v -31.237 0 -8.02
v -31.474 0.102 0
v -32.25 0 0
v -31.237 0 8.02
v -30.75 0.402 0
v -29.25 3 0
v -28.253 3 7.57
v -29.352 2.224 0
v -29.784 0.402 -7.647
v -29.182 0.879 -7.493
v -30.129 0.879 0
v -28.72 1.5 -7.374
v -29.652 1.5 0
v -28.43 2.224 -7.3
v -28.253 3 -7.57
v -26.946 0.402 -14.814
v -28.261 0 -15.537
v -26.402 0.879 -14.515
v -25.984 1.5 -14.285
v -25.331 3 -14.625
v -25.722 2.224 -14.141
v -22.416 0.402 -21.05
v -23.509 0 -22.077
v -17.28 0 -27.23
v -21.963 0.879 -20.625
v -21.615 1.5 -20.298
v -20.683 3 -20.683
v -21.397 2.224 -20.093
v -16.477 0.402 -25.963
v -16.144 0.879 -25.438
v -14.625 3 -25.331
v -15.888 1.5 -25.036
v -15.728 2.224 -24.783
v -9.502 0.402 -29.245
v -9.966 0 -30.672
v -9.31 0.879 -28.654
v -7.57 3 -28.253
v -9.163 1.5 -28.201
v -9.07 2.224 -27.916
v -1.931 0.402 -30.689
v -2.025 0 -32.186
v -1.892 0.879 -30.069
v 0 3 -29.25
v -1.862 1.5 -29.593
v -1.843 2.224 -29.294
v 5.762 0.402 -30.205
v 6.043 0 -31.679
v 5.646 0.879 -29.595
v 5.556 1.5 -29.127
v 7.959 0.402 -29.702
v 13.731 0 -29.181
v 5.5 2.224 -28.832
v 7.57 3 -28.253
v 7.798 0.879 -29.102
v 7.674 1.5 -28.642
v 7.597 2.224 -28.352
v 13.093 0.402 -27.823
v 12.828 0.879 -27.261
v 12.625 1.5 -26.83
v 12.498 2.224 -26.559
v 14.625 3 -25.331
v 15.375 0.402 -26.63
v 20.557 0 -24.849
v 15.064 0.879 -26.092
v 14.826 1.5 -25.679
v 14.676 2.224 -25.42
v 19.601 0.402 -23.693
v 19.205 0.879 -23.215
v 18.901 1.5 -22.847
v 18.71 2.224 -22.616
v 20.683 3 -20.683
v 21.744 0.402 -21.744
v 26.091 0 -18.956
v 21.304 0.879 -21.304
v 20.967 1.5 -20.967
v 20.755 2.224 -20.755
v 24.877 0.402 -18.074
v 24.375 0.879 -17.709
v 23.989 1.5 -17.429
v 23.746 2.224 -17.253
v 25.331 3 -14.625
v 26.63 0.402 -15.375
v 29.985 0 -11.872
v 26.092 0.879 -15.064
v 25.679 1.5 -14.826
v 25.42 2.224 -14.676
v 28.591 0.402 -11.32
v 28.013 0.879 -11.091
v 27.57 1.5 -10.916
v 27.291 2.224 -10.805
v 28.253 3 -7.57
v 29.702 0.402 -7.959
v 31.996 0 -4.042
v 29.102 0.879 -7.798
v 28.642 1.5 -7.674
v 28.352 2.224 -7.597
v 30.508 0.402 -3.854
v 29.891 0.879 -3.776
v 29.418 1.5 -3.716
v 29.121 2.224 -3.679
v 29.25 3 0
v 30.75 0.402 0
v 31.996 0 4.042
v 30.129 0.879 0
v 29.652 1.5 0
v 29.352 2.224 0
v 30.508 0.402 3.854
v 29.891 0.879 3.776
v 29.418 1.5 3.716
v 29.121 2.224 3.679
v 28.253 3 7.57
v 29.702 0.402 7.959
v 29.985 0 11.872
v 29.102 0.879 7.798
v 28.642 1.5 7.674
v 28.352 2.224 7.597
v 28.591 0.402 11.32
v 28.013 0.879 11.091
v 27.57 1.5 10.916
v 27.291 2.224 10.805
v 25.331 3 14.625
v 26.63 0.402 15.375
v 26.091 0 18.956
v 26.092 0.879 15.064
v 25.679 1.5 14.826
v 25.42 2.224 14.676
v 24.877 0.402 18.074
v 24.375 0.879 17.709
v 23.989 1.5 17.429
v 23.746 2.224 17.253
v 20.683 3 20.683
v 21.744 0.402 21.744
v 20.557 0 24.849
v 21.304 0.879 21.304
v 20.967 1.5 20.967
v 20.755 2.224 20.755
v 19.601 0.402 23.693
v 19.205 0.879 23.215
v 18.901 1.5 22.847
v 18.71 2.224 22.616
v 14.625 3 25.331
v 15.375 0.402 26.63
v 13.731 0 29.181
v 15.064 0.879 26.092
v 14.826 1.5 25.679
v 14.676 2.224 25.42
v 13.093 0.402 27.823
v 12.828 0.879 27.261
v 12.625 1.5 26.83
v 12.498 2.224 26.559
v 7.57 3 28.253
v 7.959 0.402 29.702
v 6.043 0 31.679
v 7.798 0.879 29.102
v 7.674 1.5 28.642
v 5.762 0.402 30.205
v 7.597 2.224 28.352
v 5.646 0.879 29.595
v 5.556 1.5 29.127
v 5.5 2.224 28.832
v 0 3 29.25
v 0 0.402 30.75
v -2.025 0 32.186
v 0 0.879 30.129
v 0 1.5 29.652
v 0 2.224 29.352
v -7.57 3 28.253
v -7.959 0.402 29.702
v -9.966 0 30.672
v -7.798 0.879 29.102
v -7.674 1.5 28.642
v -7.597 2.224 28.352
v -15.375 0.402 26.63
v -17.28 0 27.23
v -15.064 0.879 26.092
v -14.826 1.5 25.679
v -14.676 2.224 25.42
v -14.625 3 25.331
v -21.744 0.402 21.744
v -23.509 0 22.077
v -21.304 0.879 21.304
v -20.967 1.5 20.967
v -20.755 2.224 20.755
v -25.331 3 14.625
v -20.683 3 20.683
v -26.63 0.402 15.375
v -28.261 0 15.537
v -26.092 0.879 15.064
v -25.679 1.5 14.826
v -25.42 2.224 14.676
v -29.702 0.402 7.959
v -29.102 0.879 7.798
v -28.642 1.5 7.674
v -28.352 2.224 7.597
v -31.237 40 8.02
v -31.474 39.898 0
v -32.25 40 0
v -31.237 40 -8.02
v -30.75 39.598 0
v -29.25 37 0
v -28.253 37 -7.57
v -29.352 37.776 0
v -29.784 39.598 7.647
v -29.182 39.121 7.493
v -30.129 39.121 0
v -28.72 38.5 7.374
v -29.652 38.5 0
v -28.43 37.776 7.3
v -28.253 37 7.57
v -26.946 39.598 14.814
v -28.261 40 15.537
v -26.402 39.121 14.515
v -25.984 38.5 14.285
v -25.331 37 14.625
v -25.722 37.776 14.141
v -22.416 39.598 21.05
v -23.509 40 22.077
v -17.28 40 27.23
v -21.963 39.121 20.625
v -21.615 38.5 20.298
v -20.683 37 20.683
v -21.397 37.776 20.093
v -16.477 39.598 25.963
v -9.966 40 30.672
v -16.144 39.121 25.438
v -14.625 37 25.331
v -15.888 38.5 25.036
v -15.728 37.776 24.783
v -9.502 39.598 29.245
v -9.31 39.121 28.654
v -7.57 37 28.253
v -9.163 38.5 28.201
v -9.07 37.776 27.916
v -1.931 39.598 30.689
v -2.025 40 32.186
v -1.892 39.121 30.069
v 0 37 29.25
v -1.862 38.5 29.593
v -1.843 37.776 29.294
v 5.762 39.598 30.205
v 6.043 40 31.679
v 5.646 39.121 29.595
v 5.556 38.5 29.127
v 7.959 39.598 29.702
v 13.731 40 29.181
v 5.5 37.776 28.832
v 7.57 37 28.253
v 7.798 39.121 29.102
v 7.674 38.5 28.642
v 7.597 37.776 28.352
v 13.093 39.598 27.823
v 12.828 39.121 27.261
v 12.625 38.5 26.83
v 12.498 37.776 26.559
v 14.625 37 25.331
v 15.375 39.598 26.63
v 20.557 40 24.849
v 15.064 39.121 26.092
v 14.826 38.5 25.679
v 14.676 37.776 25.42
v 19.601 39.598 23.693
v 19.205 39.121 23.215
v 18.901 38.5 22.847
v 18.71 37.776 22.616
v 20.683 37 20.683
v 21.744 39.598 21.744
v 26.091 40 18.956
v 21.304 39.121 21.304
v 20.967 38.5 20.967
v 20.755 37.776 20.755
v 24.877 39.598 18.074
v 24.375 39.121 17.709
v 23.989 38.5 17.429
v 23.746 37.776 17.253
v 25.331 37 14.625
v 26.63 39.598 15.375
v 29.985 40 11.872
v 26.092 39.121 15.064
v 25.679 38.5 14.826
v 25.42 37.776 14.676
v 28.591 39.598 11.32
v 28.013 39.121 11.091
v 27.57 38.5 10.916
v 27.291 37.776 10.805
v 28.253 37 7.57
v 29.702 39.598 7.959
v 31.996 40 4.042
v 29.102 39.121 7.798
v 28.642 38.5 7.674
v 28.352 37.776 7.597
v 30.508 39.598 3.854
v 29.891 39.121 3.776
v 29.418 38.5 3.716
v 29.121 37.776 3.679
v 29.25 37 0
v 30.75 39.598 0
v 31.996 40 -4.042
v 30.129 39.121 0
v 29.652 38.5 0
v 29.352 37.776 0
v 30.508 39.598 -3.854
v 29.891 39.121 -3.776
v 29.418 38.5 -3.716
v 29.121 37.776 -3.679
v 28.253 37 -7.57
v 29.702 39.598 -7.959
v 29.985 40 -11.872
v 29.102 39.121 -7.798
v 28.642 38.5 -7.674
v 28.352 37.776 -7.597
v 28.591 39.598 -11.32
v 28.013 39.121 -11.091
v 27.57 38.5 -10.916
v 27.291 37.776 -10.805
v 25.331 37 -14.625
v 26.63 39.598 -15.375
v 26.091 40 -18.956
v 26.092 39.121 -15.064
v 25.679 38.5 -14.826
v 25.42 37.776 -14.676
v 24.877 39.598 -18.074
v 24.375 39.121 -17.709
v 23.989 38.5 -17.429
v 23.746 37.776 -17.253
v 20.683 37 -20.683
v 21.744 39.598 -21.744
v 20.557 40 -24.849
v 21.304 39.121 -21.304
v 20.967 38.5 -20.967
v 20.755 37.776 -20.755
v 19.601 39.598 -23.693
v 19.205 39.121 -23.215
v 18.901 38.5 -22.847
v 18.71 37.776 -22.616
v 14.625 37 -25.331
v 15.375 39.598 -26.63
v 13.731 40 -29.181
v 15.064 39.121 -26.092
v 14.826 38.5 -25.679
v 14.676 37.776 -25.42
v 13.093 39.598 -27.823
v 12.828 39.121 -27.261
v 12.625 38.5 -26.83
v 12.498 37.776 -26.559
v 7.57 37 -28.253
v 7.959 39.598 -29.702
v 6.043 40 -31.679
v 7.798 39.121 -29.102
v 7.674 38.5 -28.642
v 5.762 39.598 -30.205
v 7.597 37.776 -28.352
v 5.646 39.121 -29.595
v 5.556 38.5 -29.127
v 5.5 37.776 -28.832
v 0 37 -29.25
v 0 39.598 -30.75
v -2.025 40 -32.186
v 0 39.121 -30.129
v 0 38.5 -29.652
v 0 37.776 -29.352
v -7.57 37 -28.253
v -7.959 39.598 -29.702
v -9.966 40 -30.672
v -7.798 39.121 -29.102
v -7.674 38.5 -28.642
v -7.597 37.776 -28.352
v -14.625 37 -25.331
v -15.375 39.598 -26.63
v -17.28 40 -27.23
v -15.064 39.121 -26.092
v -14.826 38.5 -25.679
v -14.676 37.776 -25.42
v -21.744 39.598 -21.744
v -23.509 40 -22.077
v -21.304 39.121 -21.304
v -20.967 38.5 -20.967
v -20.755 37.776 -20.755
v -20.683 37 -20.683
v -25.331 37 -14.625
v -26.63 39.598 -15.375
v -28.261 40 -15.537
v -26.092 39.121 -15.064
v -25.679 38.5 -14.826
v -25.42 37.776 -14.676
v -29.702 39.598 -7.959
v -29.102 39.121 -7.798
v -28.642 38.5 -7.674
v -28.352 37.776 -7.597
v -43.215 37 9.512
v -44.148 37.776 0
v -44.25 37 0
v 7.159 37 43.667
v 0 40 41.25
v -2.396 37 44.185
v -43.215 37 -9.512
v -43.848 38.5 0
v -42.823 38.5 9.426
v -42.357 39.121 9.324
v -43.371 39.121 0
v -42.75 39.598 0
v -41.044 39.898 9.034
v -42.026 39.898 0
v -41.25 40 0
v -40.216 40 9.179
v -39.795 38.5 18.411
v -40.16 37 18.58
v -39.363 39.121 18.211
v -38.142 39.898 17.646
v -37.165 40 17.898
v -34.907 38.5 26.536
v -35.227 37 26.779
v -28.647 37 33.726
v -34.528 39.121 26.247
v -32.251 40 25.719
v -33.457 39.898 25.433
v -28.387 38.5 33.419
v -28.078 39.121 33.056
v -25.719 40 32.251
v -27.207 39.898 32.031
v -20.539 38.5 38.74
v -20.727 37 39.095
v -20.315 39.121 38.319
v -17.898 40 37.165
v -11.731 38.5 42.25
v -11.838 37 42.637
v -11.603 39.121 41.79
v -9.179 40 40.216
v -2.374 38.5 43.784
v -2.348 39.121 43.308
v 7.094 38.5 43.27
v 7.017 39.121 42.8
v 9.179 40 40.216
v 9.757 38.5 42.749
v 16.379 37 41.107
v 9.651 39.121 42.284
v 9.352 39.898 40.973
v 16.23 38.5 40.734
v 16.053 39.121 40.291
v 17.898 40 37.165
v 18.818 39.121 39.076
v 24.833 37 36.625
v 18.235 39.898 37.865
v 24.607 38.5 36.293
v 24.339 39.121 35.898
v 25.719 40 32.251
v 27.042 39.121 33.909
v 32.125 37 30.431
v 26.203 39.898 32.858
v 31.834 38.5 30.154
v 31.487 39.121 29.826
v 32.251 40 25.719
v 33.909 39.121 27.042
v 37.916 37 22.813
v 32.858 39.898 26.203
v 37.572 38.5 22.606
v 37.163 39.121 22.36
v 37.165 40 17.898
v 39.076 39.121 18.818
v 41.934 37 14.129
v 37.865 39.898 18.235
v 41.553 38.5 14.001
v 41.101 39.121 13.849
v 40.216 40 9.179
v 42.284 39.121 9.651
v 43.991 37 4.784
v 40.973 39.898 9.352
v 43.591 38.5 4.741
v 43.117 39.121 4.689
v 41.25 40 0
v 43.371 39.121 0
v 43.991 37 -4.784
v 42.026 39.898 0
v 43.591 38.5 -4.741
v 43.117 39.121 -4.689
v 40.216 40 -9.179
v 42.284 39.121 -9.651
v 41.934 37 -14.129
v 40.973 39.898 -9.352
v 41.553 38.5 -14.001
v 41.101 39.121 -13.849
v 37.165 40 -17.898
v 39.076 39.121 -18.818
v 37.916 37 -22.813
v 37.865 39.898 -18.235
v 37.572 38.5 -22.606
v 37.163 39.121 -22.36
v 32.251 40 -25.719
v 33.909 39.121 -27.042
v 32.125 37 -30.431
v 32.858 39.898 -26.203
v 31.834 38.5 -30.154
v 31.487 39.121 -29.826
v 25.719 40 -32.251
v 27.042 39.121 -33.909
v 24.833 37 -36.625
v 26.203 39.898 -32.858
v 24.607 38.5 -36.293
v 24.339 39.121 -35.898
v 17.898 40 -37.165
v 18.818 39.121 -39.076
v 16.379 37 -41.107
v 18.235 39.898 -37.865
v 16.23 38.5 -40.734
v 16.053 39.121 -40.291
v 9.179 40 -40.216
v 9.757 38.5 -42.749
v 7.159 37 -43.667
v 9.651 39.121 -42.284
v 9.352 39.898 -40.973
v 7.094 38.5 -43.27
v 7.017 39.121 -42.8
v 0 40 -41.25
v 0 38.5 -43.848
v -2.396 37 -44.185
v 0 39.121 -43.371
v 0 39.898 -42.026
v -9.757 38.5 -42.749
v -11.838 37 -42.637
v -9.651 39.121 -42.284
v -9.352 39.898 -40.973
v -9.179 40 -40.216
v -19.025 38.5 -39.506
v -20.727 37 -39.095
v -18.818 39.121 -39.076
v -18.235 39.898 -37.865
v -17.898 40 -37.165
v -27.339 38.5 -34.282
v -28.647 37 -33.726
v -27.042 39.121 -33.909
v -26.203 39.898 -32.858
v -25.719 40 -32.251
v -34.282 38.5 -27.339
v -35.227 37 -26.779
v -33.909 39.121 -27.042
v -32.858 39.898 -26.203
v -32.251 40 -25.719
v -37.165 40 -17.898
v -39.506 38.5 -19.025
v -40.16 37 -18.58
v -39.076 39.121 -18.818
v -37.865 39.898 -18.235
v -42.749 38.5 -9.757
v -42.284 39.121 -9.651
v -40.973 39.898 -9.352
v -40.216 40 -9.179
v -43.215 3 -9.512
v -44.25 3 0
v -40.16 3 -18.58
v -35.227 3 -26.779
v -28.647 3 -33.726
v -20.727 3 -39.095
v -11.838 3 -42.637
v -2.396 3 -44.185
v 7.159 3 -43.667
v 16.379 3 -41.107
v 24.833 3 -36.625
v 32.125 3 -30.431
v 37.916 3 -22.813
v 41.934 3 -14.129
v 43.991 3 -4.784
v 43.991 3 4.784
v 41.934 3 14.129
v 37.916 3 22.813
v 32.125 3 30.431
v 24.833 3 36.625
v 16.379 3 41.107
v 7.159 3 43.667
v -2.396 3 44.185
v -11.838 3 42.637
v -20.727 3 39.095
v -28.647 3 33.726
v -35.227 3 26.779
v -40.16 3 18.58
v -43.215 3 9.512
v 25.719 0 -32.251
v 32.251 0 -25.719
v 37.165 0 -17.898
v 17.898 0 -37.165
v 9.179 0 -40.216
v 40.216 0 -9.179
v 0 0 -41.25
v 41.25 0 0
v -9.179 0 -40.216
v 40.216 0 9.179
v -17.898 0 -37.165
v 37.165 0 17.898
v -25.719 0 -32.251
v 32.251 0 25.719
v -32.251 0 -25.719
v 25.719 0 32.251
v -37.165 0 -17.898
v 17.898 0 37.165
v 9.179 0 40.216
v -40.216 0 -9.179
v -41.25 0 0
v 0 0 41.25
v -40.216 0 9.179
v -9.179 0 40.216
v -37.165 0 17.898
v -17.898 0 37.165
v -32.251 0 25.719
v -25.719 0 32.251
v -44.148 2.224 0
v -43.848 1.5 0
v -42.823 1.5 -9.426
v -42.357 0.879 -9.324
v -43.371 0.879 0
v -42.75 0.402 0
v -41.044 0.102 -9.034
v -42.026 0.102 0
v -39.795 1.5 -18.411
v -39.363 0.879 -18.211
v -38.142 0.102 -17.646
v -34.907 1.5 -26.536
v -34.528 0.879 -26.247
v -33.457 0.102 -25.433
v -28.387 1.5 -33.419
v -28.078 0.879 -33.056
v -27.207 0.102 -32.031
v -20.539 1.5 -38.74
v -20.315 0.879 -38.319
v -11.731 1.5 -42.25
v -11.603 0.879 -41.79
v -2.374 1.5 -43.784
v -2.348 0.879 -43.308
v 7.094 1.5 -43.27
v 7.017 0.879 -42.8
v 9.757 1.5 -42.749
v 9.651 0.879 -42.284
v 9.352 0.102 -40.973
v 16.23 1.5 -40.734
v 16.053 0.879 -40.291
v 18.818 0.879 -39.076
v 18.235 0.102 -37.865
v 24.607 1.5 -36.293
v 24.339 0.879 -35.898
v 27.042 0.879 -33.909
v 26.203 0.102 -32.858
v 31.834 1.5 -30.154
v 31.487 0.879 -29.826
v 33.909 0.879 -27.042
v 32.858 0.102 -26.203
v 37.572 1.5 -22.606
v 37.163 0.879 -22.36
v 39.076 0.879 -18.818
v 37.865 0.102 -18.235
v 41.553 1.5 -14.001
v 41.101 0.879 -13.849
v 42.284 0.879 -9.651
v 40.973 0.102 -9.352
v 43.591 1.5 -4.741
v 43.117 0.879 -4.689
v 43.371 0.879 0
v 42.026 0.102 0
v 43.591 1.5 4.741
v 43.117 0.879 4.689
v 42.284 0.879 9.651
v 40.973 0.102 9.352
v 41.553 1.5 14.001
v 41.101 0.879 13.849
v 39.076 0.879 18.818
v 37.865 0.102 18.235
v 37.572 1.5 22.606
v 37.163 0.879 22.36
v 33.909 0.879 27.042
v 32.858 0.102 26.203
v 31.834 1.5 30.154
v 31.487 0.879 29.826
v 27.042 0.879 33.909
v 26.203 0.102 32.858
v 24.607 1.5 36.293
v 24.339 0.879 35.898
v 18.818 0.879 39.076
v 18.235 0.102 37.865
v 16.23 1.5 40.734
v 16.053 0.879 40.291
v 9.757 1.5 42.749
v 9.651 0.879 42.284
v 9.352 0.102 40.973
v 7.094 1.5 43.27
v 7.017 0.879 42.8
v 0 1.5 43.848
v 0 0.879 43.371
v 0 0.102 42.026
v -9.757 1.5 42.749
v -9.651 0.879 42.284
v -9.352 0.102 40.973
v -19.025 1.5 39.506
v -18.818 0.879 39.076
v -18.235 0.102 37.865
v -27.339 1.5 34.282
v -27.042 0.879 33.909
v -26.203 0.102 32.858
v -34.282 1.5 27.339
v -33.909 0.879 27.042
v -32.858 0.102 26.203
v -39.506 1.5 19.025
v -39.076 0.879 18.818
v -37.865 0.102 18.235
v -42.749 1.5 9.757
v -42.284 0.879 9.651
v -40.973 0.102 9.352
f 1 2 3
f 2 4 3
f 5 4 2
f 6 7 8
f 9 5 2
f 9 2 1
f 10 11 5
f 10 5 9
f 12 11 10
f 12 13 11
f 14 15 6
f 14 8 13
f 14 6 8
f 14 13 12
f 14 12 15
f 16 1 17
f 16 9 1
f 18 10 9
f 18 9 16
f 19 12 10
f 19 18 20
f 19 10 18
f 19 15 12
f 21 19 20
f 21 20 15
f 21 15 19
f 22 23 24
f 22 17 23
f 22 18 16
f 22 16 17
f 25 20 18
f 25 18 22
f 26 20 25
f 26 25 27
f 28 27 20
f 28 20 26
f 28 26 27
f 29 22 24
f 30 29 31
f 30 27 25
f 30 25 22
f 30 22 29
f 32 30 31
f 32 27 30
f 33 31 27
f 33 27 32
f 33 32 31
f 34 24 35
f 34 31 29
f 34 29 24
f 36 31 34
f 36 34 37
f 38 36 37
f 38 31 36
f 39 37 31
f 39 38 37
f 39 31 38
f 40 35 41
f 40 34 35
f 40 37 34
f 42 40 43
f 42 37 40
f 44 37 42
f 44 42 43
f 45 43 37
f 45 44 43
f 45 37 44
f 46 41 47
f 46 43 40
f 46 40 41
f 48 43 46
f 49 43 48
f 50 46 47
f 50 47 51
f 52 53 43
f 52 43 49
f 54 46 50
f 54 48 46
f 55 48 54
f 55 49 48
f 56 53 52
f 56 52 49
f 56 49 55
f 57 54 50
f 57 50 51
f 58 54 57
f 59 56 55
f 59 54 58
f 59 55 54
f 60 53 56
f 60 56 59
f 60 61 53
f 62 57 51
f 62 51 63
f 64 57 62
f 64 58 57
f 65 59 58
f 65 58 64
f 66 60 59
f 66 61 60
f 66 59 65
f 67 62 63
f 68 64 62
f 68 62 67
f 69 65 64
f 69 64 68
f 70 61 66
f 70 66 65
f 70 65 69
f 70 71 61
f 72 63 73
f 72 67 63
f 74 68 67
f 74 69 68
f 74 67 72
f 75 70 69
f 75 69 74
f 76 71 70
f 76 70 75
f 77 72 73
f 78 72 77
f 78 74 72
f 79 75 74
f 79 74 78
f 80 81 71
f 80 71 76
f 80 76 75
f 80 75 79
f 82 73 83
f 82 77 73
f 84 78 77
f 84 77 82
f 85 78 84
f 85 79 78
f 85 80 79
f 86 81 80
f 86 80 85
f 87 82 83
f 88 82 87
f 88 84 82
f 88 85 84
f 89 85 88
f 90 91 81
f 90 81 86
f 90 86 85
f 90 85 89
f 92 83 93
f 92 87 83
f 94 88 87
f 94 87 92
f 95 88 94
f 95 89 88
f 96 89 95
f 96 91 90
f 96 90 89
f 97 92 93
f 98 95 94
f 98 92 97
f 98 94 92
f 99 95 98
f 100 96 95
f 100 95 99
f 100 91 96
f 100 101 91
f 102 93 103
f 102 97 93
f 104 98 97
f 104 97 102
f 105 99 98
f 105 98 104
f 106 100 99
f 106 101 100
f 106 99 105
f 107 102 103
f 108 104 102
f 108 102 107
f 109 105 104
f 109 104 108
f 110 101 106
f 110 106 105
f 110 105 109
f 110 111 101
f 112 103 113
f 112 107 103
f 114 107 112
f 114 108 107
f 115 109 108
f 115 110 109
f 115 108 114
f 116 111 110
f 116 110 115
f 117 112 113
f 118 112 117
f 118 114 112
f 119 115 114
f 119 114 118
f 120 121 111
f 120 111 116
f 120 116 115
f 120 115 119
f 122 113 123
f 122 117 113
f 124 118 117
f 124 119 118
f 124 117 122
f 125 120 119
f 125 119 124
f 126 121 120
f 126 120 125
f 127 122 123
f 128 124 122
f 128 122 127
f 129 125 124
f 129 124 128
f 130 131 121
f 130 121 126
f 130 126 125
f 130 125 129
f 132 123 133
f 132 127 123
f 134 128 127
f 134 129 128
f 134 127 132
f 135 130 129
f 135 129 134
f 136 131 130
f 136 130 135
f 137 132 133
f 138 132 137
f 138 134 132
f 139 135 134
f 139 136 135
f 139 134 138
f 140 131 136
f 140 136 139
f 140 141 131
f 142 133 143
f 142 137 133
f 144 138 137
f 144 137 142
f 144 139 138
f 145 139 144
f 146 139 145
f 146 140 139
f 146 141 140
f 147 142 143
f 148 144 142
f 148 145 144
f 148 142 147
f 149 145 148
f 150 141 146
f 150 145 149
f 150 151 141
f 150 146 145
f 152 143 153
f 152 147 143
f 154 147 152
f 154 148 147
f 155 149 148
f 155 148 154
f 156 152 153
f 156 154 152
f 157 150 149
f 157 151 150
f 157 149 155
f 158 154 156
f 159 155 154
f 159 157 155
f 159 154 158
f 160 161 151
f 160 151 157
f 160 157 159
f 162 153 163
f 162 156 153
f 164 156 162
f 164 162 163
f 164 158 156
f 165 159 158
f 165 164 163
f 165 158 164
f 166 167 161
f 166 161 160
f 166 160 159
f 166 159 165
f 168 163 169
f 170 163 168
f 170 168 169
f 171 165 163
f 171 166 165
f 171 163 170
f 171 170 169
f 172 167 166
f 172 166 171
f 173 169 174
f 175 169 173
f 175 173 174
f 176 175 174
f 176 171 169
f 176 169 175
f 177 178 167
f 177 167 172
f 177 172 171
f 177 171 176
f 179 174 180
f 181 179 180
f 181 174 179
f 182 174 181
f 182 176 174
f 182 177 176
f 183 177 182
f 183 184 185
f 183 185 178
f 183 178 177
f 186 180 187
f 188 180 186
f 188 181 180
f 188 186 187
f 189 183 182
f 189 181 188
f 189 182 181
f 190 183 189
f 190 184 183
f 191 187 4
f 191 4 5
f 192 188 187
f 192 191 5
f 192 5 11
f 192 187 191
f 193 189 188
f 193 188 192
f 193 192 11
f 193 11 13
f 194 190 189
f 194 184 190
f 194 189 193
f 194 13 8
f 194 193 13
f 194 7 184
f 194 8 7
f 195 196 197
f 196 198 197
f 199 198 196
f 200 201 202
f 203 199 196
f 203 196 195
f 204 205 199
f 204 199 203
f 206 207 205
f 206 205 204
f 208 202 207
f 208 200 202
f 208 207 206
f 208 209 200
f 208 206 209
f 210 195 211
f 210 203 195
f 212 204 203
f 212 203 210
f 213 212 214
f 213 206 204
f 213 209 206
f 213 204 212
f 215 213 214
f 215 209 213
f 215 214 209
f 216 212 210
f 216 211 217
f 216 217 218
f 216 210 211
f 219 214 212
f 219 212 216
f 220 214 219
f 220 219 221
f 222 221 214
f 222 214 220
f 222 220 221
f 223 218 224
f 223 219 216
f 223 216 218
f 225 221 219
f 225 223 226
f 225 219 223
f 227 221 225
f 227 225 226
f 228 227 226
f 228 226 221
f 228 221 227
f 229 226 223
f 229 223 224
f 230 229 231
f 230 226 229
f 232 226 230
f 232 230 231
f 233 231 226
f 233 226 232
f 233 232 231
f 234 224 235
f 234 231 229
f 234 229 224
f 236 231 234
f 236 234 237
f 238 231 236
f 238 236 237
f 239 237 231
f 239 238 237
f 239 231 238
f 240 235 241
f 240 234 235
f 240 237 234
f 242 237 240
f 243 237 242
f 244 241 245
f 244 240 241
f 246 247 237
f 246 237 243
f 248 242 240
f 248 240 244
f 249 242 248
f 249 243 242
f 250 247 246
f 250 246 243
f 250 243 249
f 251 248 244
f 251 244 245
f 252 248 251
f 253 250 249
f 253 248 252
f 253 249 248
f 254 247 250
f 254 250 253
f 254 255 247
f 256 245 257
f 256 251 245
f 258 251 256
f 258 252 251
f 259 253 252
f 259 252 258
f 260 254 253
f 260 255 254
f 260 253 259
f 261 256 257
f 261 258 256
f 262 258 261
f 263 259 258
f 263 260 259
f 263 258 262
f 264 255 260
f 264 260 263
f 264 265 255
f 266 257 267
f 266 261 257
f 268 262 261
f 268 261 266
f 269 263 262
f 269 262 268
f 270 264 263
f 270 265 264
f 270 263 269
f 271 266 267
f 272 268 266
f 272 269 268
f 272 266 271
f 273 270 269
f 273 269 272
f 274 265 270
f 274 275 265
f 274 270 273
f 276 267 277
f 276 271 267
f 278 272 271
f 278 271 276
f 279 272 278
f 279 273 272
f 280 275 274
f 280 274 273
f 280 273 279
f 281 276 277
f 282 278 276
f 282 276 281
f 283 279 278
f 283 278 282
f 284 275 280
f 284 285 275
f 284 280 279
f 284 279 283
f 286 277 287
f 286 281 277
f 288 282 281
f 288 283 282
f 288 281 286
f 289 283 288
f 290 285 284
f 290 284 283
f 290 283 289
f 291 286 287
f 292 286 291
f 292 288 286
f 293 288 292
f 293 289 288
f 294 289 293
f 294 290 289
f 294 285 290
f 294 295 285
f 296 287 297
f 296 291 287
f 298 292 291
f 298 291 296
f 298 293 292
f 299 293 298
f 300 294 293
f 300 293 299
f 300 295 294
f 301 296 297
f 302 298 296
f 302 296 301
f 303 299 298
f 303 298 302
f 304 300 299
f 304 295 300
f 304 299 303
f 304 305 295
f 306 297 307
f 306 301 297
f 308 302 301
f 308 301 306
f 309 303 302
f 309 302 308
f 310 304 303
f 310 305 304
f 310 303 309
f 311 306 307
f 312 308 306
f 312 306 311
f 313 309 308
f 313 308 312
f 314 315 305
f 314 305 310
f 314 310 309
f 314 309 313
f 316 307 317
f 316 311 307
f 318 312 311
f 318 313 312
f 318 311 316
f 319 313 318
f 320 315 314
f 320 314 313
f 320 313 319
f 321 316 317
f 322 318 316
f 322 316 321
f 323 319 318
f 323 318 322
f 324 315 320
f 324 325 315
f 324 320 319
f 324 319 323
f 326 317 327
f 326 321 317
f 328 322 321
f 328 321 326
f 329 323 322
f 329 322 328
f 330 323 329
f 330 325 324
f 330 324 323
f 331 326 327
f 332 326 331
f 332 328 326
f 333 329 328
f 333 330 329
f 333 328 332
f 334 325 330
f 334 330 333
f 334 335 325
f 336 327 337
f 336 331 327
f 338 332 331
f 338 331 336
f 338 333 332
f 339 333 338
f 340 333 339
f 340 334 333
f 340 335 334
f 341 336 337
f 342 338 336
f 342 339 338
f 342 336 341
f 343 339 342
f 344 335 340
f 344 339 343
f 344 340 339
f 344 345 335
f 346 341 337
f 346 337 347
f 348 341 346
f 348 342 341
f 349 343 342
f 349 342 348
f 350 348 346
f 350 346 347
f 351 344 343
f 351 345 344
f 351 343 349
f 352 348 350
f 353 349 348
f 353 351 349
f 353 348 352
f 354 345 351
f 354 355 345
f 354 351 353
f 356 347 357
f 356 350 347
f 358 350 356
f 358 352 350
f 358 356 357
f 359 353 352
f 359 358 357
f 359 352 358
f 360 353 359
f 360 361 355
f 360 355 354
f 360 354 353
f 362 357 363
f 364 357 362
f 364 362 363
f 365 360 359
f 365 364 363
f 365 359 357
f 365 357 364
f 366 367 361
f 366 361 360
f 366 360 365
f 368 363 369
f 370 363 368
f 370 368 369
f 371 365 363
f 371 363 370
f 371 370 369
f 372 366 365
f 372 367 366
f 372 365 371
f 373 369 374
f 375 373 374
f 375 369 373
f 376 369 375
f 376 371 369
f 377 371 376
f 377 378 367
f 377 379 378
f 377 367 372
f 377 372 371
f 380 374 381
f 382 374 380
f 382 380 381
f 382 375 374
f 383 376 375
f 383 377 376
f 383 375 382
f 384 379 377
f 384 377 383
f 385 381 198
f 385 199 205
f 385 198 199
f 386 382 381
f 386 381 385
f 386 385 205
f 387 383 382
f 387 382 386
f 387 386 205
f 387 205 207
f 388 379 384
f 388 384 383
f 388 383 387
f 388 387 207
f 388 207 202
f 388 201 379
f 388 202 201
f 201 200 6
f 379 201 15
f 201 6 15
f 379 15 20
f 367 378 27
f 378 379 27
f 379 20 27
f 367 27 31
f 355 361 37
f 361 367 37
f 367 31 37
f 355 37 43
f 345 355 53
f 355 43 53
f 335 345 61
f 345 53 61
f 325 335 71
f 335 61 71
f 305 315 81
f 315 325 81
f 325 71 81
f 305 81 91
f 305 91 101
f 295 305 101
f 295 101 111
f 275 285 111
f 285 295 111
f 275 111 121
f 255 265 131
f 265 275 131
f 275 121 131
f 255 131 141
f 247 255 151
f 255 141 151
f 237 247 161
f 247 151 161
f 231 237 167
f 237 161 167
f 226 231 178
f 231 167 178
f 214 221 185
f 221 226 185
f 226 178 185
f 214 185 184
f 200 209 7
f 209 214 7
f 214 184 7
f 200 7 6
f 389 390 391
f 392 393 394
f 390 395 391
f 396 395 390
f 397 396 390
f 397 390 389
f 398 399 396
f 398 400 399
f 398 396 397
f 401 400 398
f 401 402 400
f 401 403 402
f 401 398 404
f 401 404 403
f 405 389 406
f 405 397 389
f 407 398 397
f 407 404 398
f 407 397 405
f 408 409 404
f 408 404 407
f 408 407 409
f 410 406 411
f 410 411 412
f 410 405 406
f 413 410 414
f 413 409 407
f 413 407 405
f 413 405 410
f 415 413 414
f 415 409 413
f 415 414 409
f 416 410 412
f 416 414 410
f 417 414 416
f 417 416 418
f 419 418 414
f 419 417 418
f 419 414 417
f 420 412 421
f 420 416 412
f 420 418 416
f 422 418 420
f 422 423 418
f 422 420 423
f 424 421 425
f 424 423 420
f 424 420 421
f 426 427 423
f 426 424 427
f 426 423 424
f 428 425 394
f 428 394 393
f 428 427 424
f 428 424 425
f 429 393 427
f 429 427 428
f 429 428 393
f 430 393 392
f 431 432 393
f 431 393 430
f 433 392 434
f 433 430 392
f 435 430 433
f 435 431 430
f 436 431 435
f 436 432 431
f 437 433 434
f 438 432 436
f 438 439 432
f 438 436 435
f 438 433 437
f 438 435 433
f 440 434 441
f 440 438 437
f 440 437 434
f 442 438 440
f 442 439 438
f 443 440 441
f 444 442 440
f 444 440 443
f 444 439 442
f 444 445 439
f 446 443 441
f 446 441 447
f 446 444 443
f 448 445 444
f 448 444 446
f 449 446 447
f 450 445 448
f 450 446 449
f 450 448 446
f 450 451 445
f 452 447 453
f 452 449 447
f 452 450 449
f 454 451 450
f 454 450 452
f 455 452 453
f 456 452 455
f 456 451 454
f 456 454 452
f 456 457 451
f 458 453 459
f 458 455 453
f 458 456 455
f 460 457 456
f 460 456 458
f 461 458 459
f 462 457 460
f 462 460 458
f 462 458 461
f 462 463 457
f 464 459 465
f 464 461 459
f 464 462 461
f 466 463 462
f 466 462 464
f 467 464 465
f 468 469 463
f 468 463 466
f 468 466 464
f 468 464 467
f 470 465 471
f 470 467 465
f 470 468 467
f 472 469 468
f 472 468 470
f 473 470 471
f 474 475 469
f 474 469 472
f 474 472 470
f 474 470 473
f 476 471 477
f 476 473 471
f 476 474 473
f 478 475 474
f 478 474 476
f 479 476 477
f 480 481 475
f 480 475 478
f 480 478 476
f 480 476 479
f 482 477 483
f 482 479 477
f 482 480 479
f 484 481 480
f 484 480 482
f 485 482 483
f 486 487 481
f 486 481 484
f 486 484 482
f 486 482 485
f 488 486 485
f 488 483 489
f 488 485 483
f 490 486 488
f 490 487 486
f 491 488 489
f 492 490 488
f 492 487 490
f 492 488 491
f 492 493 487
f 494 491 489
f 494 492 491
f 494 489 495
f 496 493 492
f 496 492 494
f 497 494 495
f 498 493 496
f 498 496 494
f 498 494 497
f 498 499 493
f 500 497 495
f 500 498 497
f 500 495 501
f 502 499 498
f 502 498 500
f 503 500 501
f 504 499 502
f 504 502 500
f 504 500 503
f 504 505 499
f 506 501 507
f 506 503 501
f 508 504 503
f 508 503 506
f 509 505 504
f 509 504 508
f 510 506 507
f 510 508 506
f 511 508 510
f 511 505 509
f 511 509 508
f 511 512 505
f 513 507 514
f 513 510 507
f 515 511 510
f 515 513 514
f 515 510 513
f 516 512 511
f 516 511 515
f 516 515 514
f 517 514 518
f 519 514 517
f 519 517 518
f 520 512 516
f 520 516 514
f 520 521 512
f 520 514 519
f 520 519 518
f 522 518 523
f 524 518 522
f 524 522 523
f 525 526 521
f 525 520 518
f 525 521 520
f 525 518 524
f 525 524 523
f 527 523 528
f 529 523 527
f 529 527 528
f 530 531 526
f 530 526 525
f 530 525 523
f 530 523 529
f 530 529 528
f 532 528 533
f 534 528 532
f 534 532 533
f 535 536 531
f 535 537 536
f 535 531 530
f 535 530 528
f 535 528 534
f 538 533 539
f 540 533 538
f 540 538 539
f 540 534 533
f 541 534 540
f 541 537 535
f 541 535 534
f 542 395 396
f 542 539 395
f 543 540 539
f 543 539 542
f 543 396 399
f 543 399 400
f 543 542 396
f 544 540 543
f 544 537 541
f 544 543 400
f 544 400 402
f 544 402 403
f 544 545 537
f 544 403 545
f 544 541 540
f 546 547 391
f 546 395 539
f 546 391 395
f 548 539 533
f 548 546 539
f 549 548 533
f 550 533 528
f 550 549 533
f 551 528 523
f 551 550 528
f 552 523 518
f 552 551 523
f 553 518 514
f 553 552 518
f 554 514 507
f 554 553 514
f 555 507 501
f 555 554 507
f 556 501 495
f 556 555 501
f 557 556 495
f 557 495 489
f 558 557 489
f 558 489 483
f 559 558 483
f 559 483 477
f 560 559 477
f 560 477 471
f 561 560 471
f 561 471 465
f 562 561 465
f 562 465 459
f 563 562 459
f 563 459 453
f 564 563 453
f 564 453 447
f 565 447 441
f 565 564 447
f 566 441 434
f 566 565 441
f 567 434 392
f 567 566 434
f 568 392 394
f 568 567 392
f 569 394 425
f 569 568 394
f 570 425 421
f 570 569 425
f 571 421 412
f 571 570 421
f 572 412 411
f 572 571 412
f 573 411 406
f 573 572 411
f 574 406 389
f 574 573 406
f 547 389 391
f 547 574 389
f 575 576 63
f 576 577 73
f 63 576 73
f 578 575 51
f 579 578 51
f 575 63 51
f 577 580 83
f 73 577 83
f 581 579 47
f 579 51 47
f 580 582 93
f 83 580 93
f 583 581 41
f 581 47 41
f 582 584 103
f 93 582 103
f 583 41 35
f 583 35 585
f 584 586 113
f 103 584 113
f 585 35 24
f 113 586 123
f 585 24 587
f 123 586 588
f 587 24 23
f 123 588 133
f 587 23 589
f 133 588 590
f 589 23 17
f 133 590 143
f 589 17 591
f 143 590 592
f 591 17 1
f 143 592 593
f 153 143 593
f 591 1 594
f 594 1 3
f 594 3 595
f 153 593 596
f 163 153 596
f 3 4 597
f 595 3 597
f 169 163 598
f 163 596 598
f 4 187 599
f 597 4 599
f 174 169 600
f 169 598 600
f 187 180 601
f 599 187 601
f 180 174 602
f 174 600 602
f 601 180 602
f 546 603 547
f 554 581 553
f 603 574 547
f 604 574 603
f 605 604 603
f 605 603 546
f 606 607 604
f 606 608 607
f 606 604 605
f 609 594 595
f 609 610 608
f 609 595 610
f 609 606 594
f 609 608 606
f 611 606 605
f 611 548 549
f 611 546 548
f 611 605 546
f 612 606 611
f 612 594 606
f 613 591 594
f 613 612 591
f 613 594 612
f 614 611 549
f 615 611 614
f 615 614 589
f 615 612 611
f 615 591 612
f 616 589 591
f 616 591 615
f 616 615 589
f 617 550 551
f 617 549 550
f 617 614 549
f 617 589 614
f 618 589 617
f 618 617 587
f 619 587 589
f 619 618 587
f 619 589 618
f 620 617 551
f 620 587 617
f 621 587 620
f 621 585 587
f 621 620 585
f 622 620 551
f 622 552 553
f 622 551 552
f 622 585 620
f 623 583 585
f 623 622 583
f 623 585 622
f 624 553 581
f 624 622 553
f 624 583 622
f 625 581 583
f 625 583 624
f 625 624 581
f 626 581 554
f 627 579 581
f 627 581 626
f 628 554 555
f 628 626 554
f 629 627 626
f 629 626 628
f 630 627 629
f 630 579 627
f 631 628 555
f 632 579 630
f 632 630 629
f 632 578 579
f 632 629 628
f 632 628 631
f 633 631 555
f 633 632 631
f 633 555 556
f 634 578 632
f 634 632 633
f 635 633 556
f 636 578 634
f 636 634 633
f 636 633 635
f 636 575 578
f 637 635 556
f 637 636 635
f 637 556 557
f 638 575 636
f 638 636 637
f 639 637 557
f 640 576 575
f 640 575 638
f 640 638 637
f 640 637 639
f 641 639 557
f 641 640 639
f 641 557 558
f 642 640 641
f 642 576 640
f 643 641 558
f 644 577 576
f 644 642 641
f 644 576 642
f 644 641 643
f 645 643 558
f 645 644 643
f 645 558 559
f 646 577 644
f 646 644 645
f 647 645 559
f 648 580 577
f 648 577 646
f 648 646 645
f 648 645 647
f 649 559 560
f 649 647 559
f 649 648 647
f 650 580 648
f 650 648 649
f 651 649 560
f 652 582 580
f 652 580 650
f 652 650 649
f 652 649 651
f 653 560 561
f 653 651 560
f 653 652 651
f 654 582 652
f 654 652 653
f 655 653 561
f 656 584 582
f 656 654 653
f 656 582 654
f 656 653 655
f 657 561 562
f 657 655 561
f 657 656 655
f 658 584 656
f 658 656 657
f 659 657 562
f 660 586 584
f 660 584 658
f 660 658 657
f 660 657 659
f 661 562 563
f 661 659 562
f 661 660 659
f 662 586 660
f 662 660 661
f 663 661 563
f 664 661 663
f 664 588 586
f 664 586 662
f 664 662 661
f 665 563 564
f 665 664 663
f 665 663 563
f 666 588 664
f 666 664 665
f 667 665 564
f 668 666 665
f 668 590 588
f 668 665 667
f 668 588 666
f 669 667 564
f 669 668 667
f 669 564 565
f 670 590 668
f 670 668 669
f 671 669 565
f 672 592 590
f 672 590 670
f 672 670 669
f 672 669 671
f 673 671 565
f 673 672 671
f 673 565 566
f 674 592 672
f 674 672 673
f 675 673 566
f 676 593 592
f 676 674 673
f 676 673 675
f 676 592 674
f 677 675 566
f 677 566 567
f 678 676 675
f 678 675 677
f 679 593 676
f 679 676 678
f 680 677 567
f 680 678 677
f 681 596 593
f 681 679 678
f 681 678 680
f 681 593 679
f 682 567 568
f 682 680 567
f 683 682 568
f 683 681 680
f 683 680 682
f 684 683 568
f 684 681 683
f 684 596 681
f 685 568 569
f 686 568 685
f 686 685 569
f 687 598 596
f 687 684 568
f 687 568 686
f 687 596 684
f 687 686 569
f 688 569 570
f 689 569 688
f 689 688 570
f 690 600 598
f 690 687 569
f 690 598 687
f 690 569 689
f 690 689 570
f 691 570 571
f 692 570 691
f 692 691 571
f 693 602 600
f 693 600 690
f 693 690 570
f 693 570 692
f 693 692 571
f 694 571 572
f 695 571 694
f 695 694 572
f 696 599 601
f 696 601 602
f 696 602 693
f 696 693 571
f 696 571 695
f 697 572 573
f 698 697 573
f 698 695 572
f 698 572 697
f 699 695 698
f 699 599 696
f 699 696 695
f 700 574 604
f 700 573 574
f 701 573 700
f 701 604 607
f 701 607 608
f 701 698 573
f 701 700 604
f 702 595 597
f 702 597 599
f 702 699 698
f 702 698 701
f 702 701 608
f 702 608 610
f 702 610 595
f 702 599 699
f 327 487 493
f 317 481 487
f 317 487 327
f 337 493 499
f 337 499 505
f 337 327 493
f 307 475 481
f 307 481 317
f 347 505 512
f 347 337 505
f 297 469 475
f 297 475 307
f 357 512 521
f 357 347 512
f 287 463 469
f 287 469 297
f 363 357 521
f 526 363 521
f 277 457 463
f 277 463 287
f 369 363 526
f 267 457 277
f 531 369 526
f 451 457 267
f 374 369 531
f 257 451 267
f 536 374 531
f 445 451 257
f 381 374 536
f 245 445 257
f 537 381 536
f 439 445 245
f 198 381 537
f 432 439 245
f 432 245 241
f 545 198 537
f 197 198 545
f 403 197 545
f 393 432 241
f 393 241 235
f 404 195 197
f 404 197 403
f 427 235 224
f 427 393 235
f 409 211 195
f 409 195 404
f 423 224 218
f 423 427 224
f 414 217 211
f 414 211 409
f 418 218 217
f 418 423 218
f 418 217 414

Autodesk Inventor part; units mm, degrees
ref_plane "YZ Plane" through (0, 0, 0) normal (1, 0, 0) x (0, 1, 0)
ref_plane "XZ Plane" through (0, 0, 0) normal (0, 1, 0) x (-1, 0, 0)
ref_plane "XY Plane" through (0, 0, 0) normal (0, 0, 1) x (1, 0, 0)
sketch "Sketch1" plane through (0, 0, 0) normal (0, 1, 0) x (-1, 0, 0)
  circle A0 centre (0, 0) radius 29.25
  circle A1 centre (0, 0) radius 44.25
  dimension "d0" = 58.5
  dimension "d1" = 15
extrude "Extrusion1" add sketch "Sketch1" along normal blind 40
fillet "Fillet1" radius 3 2 edges at (44.25, 40, 0) (44.25, 0, 0)
fillet "Fillet2" radius 3 2 edges at (29.25, 40, 0) (29.25, 0, 0)
properties part number "guma"
